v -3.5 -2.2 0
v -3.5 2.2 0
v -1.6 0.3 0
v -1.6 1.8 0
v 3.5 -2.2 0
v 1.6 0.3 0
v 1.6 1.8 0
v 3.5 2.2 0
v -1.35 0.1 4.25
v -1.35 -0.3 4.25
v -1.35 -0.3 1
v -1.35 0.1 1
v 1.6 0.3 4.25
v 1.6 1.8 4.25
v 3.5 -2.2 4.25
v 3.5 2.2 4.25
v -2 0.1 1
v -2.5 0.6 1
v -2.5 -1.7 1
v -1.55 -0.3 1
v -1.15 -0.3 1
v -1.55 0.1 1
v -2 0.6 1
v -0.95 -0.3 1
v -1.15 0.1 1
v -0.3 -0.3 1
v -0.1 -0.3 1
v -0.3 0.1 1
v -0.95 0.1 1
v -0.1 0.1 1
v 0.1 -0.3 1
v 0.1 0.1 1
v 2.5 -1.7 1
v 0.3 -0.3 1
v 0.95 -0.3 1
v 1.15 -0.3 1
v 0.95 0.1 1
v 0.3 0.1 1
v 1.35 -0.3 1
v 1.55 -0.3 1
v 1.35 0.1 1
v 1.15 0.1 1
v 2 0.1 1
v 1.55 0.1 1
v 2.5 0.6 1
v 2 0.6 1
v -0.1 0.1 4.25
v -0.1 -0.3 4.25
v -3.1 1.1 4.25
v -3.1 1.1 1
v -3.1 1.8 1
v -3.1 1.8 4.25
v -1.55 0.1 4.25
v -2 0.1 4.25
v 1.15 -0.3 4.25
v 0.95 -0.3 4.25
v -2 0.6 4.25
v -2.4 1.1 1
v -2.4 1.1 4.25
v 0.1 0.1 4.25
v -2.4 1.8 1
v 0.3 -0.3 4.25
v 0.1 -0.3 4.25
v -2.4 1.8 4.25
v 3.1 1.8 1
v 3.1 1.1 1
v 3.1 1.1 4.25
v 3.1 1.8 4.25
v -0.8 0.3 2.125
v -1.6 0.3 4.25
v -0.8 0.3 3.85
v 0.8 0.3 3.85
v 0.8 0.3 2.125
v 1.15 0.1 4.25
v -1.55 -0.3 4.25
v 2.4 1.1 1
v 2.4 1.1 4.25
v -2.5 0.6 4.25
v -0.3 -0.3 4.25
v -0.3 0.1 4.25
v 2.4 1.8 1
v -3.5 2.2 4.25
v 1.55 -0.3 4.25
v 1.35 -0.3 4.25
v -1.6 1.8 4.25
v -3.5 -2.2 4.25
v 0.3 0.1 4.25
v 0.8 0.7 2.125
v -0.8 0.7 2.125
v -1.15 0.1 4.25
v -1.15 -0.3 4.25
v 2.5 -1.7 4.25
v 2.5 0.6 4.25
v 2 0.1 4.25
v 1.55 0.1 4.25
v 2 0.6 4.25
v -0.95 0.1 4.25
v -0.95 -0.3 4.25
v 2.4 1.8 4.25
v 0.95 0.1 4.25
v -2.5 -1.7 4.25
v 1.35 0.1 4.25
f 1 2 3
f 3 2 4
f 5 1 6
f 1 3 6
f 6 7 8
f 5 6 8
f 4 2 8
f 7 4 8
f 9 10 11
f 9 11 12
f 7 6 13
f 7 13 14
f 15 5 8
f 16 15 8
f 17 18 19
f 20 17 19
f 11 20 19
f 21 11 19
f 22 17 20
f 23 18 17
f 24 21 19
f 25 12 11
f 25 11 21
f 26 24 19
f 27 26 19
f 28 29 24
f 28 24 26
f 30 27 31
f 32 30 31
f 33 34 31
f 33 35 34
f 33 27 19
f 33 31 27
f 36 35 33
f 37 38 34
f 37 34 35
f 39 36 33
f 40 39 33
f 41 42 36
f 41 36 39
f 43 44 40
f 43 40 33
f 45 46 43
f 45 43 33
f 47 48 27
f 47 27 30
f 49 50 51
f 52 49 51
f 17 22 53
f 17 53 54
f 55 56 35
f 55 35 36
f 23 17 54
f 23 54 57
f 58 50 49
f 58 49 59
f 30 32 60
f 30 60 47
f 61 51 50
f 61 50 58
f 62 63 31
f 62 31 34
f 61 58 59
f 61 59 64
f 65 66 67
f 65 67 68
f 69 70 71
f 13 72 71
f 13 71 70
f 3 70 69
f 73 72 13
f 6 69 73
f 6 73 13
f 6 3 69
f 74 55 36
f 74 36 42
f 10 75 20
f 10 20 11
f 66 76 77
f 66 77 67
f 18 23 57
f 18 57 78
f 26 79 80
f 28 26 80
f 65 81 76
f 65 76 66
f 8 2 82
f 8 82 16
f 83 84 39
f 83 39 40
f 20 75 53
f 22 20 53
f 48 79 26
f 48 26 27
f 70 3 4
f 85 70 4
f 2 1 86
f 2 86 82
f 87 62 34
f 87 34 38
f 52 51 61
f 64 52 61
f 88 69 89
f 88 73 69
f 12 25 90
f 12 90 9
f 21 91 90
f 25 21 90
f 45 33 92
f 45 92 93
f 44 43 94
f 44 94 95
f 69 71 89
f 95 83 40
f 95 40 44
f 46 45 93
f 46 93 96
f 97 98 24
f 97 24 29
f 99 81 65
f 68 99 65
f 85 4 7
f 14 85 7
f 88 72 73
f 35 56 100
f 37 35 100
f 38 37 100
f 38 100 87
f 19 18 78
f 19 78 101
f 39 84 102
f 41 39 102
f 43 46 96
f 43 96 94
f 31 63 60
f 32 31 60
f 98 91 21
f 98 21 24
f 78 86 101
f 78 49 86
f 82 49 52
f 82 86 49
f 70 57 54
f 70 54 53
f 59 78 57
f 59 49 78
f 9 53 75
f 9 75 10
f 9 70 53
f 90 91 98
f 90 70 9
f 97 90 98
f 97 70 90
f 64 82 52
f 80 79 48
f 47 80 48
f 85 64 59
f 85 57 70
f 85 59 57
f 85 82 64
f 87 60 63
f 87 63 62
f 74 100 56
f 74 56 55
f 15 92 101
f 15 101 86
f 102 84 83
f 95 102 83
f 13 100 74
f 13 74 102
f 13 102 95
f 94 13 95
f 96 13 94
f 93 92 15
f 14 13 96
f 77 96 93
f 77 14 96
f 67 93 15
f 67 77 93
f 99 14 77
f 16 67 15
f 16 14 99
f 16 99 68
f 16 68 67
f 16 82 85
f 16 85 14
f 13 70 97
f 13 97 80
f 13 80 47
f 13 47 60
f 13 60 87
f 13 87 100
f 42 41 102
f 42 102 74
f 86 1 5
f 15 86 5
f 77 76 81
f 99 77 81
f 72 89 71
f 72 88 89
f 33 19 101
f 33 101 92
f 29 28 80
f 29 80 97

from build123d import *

# Parameters (mm, degrees)
SKETCH1_W                = 7
SKETCH1_H                = 4.4
SKETCH1_W_2              = 0.7
SKETCH1_H_2              = 0.7
SKETCH1_W_3              = 3.2
SKETCH1_H_3              = 1.5
BOSS_EXTRUDE1_DEPTH      = 4.25
SKETCH1_2_W              = 0.7
SKETCH1_2_H              = 0.7
BOSS_EXTRUDE2_DEPTH      = 1
BOSS_EXTRUDE3_START      = 4.25
SKETCH3_W                = 0.2
SKETCH3_H                = 0.4
BOSS_EXTRUDE3_DEPTH      = 3.25
LPATTERN1_COUNT          = 3
LPATTERN1_PITCH          = 1.25
BOSS_EXTRUDE4_DEPTH      = 0.8
BOSS_EXTRUDE4_DEPTH_BACK = 0.8


with BuildPart() as part:
    # Sketch1 → Boss-Extrude1 (new body)
    with BuildSketch(Plane.XY):
        Rectangle(SKETCH1_W, SKETCH1_H)
        Polygon((-2.5, 0.6), (-2.5, -1.7), (2.5, -1.7), (2.5, 0.6), (2, 0.6), (2, 0.1), (-2, 0.1), (-2, 0.6), align=None, mode=Mode.SUBTRACT)
        with Locations((-2.75, 1.45)):
            Rectangle(SKETCH1_W_2, SKETCH1_H_2, mode=Mode.SUBTRACT)
        with Locations((2.75, 1.45)):
            Rectangle(SKETCH1_W_2, SKETCH1_H_2, mode=Mode.SUBTRACT)
        with Locations((0, 1.05)):
            Rectangle(SKETCH1_W_3, SKETCH1_H_3, mode=Mode.SUBTRACT)
    extrude(amount=BOSS_EXTRUDE1_DEPTH)

    # Sketch1<2> → Boss-Extrude2 (add)
    with BuildSketch(Plane.XY):
        with Locations((2.75, 1.45)):
            Rectangle(SKETCH1_2_W, SKETCH1_2_H)
        Polygon((-2, 0.1), (-2, 0.6), (-2.5, 0.6), (-2.5, -1.7), (2.5, -1.7), (2.5, 0.6), (2, 0.6), (2, 0.1), align=None)
        with Locations((-2.75, 1.45)):
            Rectangle(SKETCH1_2_W, SKETCH1_2_H)
    extrude(amount=BOSS_EXTRUDE2_DEPTH)

    # Sketch3 → Boss-Extrude3 (add)
    with BuildSketch(Plane.XY.offset(BOSS_EXTRUDE3_START)):
        with Locations((1.05, -0.1)):
            Rectangle(SKETCH3_W, SKETCH3_H)
        with Locations((1.45, -0.1)):
            Rectangle(SKETCH3_W, SKETCH3_H)
    boss_extrude3 = extrude(amount=-BOSS_EXTRUDE3_DEPTH)

    # LPattern1: Boss-Extrude3 ×3
    with Locations(*[(-i * LPATTERN1_PITCH, 0, 0) for i in range(1, LPATTERN1_COUNT)]):
        add(boss_extrude3)

    # Sketch4 → Boss-Extrude4 (add, two sides)
    with BuildSketch(Plane(origin=(0, 0, 0), x_dir=(0, 0, -1), z_dir=(1, 0, 0))) as boss_extrude4_sk:
        Polygon((-2.125, 0.7), (-3.85, 0.3), (-2.125, 0.3), align=None)
    extrude(amount=BOSS_EXTRUDE4_DEPTH)
    extrude(boss_extrude4_sk.sketch, amount=-BOSS_EXTRUDE4_DEPTH_BACK)


solid = part.part
